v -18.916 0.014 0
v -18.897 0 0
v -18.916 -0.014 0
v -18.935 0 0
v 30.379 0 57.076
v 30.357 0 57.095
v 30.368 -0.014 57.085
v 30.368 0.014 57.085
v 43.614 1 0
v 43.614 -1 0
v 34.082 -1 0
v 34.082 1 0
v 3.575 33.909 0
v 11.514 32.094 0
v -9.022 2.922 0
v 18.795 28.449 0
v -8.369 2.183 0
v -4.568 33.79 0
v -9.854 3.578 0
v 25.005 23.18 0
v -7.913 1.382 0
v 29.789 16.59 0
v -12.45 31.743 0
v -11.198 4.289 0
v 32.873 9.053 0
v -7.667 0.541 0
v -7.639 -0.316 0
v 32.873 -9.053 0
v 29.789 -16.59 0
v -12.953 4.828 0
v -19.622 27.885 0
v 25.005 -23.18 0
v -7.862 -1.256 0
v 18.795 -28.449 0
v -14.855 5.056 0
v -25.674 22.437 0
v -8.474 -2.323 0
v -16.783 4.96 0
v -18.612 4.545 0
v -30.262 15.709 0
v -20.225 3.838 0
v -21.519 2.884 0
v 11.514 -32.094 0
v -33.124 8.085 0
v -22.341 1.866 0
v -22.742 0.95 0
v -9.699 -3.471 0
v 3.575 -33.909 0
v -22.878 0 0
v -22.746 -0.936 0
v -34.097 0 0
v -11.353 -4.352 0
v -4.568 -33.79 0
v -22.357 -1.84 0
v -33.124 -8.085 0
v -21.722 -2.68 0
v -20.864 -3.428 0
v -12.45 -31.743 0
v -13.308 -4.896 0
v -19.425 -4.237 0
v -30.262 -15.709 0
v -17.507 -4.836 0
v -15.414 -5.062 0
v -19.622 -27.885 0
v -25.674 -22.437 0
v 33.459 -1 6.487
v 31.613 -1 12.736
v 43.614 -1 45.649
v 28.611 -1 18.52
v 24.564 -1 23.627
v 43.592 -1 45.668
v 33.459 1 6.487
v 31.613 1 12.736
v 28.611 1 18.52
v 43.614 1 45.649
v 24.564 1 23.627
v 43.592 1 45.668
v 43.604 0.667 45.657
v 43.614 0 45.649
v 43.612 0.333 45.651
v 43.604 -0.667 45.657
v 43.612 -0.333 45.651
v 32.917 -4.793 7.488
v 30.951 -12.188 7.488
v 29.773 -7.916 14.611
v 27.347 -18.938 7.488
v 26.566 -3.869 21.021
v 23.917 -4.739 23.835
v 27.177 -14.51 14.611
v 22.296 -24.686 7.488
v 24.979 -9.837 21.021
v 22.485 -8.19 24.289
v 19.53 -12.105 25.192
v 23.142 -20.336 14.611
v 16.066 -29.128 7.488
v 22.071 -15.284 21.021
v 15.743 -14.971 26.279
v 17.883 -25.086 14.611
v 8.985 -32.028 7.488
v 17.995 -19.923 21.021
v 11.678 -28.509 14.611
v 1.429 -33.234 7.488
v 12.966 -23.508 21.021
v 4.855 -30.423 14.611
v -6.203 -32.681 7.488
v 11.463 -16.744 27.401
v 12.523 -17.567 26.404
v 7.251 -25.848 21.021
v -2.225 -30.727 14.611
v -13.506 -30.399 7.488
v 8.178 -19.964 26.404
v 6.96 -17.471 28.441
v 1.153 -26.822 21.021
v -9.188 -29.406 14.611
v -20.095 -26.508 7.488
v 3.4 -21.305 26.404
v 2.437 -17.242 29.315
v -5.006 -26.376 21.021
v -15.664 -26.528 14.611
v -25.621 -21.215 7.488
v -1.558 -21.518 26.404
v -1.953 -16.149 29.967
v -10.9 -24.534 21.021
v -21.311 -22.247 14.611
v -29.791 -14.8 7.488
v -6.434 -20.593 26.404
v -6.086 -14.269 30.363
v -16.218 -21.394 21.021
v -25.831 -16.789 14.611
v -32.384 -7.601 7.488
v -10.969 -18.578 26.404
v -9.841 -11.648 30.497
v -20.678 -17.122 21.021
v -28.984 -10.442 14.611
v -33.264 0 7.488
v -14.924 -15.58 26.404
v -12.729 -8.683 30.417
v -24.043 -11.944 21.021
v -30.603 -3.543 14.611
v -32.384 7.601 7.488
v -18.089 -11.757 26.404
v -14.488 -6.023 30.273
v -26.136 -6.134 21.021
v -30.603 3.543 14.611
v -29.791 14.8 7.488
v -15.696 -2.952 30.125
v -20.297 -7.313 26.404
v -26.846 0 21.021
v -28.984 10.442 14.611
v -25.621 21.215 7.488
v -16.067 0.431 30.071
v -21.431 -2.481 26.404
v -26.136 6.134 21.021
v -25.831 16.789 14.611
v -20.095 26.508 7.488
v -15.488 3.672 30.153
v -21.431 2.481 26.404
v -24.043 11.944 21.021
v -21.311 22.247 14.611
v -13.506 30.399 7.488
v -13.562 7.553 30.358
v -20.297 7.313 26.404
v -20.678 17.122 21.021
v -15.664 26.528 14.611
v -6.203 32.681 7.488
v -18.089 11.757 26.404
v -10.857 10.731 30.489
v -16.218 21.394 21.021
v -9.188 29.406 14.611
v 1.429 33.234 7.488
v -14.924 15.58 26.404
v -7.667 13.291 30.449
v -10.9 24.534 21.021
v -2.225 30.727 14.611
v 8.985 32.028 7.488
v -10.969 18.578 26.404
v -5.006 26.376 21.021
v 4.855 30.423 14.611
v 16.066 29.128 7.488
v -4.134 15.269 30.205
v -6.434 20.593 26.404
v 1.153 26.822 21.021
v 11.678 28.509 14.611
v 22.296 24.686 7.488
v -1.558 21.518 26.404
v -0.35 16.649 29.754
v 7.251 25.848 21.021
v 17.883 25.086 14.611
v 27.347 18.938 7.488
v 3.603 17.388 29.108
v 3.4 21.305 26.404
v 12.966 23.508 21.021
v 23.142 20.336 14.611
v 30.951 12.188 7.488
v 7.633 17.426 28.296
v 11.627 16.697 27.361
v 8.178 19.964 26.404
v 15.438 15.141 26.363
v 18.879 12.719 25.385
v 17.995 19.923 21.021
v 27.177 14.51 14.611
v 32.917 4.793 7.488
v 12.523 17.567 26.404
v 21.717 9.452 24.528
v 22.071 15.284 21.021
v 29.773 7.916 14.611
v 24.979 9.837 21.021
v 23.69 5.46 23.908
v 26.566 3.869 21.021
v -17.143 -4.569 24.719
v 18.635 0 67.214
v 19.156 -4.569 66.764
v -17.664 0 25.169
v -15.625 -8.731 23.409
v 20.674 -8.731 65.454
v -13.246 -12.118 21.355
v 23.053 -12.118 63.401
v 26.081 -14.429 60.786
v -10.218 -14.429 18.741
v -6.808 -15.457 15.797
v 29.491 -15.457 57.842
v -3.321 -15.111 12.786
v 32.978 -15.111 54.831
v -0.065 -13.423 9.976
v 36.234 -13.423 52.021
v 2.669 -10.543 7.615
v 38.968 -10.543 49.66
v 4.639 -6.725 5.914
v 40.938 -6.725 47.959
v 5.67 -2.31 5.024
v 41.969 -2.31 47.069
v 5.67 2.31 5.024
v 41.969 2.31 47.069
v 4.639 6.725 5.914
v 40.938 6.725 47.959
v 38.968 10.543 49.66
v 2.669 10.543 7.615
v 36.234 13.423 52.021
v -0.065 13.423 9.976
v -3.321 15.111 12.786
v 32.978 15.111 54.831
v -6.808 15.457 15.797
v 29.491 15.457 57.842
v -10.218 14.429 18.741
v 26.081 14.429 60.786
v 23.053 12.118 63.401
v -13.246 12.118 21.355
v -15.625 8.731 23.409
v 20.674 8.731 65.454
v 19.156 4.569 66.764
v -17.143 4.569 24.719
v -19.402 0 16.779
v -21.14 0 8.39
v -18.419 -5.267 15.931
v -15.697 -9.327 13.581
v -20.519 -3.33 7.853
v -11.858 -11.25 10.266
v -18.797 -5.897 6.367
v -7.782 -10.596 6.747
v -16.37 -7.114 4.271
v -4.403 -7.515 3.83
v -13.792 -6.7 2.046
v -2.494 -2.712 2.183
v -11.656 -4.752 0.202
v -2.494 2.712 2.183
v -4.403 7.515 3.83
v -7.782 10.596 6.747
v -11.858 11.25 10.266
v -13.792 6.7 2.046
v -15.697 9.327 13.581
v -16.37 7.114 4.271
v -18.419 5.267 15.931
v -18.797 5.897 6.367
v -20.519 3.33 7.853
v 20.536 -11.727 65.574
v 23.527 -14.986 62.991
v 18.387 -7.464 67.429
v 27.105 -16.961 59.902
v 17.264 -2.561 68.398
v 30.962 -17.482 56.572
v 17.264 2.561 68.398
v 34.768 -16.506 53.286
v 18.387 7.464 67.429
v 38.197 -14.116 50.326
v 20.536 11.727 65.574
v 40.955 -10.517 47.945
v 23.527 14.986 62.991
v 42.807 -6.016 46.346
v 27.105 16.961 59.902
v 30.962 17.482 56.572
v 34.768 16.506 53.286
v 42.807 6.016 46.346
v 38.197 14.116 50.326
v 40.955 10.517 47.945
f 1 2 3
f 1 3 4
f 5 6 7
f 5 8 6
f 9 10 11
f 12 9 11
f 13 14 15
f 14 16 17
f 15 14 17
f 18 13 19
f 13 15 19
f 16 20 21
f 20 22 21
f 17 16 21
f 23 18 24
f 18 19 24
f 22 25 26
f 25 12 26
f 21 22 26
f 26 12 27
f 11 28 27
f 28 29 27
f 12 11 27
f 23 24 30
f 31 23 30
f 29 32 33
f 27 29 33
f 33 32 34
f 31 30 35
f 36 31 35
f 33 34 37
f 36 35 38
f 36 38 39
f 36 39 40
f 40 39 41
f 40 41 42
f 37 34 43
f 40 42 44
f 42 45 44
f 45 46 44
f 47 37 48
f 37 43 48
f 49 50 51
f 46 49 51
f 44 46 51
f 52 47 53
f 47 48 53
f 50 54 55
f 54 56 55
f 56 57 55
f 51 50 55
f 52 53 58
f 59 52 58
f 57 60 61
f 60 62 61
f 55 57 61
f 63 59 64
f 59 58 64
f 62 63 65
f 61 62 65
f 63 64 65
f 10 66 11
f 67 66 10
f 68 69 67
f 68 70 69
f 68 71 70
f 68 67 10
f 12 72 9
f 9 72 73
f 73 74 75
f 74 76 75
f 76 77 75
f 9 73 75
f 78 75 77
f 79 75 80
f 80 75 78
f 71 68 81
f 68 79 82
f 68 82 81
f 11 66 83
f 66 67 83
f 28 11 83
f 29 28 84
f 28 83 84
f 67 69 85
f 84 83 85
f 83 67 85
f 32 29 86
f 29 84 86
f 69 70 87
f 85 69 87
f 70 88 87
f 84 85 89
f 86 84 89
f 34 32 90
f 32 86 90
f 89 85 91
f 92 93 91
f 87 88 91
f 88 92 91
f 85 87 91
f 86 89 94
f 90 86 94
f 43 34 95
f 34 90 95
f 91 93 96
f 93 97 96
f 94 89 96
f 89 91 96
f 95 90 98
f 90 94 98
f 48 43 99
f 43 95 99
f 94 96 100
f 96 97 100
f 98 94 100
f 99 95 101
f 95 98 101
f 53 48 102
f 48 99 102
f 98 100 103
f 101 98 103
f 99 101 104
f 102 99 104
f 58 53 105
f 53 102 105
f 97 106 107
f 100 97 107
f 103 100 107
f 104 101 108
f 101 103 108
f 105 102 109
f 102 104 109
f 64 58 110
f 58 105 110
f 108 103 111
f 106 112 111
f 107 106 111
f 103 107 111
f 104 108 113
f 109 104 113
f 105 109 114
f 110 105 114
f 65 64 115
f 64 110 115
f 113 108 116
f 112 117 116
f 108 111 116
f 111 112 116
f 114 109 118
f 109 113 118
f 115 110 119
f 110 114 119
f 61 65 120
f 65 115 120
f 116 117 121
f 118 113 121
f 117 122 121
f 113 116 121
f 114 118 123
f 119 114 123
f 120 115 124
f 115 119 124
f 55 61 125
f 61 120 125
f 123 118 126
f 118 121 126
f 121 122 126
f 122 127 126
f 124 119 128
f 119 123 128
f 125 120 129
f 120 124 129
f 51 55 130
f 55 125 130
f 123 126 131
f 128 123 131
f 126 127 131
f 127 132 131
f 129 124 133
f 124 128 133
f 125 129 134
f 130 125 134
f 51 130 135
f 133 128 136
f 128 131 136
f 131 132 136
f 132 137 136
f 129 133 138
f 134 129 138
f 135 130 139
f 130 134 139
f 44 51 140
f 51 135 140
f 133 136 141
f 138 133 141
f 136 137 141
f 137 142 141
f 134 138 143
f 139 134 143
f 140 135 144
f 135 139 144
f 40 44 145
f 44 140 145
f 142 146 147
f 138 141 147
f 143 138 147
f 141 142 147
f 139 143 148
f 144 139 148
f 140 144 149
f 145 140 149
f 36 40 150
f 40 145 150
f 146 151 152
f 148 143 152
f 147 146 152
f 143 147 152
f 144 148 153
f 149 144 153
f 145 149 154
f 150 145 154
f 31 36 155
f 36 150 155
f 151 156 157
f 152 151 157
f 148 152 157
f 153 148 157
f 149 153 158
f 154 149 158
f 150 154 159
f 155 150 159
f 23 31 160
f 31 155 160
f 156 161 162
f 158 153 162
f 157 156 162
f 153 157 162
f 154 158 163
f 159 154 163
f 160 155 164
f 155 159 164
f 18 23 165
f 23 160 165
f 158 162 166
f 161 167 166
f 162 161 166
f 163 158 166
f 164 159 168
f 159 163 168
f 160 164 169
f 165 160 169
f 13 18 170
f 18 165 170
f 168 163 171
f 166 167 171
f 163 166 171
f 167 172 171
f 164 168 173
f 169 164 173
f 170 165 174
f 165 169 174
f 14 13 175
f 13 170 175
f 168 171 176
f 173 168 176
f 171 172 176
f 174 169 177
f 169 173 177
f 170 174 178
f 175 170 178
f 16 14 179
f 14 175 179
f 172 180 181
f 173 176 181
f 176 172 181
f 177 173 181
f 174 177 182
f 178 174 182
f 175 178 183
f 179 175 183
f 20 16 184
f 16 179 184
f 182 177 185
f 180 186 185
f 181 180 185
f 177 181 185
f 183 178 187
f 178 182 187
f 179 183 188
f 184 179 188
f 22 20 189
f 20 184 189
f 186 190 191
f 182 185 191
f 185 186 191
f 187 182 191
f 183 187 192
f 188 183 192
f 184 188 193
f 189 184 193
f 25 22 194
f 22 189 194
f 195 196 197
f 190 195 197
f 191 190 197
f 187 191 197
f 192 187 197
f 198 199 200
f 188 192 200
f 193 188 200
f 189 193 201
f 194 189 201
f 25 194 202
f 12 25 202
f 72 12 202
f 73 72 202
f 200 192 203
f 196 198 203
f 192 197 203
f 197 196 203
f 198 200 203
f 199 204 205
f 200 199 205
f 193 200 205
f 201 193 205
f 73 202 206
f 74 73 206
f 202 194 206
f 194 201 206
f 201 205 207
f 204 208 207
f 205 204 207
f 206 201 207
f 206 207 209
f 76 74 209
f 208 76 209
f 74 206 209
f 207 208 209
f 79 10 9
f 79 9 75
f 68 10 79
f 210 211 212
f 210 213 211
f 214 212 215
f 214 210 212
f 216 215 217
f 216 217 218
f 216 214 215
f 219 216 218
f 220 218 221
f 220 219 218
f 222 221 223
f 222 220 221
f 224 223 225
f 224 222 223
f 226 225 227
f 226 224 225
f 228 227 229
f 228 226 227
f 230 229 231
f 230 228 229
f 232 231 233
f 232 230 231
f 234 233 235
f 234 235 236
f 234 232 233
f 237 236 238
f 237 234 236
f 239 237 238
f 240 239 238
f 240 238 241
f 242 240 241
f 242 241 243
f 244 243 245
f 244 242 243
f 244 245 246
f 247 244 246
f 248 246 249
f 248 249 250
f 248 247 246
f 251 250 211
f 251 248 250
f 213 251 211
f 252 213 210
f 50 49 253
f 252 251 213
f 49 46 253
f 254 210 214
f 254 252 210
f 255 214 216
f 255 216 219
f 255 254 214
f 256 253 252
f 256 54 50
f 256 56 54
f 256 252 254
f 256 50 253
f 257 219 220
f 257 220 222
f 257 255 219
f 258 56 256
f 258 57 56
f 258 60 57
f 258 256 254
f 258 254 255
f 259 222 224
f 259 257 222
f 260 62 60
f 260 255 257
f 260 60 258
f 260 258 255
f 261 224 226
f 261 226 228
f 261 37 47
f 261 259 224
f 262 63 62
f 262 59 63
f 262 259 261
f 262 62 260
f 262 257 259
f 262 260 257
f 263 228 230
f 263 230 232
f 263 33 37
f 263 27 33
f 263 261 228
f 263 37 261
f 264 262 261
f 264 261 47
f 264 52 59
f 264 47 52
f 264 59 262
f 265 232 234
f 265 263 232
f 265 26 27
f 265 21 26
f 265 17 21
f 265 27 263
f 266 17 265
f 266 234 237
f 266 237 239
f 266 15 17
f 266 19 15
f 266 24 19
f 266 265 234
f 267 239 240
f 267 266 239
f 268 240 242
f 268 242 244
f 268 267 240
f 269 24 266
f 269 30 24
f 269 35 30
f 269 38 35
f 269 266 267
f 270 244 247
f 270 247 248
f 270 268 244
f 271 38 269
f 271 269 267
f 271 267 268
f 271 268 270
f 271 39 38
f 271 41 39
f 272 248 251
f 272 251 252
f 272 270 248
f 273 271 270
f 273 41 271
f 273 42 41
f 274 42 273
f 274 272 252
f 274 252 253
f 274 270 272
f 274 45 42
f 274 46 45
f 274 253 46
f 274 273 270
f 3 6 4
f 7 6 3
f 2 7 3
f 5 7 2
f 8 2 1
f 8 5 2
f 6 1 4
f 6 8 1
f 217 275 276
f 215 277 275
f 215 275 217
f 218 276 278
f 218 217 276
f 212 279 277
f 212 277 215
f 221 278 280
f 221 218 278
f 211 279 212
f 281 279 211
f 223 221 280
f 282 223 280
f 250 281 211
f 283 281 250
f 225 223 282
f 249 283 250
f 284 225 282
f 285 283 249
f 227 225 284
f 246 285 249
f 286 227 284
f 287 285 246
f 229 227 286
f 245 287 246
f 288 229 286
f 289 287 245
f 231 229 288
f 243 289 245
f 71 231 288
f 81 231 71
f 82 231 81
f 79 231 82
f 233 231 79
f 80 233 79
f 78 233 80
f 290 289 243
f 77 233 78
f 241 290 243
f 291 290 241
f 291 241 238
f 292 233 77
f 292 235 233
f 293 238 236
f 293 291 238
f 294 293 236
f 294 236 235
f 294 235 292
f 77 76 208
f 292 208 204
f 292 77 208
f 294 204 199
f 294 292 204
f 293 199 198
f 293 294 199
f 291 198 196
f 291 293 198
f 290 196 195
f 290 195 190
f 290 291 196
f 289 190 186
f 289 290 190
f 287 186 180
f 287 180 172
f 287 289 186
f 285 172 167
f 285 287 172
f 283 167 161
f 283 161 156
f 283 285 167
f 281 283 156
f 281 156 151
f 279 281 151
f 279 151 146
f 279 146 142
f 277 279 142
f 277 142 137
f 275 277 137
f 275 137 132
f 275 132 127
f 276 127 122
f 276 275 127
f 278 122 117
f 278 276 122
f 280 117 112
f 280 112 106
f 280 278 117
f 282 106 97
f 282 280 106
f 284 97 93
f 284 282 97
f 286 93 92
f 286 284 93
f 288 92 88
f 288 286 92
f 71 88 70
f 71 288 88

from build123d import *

# Parameters (mm, degrees)
F5_DEPTH = 1


with BuildPart() as f1:
    # F0 (on Front) → F1 (revolve)
    with BuildSketch(Plane.XZ):
        Polygon((-9.0428221142, 11.4360648491), (4.2035517583, 0), (43.6141065063, 45.6491764956), (30.3677326338, 57.0852413447), align=None)
    revolve(axis=Axis((10.6624552598, 0, 34.2606530969), (0.6534894199, 0, 0.7569356499)))

    # F2 (on Front) → F3 (revolve)
    with BuildSketch(Plane.XZ):
        with BuildLine():
            ThreePointArc((34.096867421, 0), (24.1101261706, 24.1101261706), (0, 34.096867421))
            Line((0, 34.096867421), (0, 0))
            Line((0, 0), (34.096867421, 0))
        make_face()
    revolve(axis=Axis((0, 0, 17.0484337105), (0, 0, -1)))

    # F4 (on Front) → F5 (join, symmetric)
    with BuildSketch(Plane.XZ):
        Polygon((0, 22.3168283701), (0, 0), (43.6141065063, 0), (43.6141065063, 45.6491764956), (30.1666682649, 57.2588273528), align=None)
    extrude(amount=F5_DEPTH, both=True)

    # F6 (on Front) → F7 (revolve, cut)
    with BuildSketch(Plane.XZ):
        Polygon((-24.1225756619, -6.0089087161), (30.3569104257, 57.0945845412), (18.6352300611, 67.2143273539), (-17.6638786383, 25.1691333633), align=None)
    revolve(axis=Axis((10.6624552598, 0, 34.2606530969), (0.6534894199, 0, 0.7569356499)), mode=Mode.SUBTRACT)


solid = f1.part
